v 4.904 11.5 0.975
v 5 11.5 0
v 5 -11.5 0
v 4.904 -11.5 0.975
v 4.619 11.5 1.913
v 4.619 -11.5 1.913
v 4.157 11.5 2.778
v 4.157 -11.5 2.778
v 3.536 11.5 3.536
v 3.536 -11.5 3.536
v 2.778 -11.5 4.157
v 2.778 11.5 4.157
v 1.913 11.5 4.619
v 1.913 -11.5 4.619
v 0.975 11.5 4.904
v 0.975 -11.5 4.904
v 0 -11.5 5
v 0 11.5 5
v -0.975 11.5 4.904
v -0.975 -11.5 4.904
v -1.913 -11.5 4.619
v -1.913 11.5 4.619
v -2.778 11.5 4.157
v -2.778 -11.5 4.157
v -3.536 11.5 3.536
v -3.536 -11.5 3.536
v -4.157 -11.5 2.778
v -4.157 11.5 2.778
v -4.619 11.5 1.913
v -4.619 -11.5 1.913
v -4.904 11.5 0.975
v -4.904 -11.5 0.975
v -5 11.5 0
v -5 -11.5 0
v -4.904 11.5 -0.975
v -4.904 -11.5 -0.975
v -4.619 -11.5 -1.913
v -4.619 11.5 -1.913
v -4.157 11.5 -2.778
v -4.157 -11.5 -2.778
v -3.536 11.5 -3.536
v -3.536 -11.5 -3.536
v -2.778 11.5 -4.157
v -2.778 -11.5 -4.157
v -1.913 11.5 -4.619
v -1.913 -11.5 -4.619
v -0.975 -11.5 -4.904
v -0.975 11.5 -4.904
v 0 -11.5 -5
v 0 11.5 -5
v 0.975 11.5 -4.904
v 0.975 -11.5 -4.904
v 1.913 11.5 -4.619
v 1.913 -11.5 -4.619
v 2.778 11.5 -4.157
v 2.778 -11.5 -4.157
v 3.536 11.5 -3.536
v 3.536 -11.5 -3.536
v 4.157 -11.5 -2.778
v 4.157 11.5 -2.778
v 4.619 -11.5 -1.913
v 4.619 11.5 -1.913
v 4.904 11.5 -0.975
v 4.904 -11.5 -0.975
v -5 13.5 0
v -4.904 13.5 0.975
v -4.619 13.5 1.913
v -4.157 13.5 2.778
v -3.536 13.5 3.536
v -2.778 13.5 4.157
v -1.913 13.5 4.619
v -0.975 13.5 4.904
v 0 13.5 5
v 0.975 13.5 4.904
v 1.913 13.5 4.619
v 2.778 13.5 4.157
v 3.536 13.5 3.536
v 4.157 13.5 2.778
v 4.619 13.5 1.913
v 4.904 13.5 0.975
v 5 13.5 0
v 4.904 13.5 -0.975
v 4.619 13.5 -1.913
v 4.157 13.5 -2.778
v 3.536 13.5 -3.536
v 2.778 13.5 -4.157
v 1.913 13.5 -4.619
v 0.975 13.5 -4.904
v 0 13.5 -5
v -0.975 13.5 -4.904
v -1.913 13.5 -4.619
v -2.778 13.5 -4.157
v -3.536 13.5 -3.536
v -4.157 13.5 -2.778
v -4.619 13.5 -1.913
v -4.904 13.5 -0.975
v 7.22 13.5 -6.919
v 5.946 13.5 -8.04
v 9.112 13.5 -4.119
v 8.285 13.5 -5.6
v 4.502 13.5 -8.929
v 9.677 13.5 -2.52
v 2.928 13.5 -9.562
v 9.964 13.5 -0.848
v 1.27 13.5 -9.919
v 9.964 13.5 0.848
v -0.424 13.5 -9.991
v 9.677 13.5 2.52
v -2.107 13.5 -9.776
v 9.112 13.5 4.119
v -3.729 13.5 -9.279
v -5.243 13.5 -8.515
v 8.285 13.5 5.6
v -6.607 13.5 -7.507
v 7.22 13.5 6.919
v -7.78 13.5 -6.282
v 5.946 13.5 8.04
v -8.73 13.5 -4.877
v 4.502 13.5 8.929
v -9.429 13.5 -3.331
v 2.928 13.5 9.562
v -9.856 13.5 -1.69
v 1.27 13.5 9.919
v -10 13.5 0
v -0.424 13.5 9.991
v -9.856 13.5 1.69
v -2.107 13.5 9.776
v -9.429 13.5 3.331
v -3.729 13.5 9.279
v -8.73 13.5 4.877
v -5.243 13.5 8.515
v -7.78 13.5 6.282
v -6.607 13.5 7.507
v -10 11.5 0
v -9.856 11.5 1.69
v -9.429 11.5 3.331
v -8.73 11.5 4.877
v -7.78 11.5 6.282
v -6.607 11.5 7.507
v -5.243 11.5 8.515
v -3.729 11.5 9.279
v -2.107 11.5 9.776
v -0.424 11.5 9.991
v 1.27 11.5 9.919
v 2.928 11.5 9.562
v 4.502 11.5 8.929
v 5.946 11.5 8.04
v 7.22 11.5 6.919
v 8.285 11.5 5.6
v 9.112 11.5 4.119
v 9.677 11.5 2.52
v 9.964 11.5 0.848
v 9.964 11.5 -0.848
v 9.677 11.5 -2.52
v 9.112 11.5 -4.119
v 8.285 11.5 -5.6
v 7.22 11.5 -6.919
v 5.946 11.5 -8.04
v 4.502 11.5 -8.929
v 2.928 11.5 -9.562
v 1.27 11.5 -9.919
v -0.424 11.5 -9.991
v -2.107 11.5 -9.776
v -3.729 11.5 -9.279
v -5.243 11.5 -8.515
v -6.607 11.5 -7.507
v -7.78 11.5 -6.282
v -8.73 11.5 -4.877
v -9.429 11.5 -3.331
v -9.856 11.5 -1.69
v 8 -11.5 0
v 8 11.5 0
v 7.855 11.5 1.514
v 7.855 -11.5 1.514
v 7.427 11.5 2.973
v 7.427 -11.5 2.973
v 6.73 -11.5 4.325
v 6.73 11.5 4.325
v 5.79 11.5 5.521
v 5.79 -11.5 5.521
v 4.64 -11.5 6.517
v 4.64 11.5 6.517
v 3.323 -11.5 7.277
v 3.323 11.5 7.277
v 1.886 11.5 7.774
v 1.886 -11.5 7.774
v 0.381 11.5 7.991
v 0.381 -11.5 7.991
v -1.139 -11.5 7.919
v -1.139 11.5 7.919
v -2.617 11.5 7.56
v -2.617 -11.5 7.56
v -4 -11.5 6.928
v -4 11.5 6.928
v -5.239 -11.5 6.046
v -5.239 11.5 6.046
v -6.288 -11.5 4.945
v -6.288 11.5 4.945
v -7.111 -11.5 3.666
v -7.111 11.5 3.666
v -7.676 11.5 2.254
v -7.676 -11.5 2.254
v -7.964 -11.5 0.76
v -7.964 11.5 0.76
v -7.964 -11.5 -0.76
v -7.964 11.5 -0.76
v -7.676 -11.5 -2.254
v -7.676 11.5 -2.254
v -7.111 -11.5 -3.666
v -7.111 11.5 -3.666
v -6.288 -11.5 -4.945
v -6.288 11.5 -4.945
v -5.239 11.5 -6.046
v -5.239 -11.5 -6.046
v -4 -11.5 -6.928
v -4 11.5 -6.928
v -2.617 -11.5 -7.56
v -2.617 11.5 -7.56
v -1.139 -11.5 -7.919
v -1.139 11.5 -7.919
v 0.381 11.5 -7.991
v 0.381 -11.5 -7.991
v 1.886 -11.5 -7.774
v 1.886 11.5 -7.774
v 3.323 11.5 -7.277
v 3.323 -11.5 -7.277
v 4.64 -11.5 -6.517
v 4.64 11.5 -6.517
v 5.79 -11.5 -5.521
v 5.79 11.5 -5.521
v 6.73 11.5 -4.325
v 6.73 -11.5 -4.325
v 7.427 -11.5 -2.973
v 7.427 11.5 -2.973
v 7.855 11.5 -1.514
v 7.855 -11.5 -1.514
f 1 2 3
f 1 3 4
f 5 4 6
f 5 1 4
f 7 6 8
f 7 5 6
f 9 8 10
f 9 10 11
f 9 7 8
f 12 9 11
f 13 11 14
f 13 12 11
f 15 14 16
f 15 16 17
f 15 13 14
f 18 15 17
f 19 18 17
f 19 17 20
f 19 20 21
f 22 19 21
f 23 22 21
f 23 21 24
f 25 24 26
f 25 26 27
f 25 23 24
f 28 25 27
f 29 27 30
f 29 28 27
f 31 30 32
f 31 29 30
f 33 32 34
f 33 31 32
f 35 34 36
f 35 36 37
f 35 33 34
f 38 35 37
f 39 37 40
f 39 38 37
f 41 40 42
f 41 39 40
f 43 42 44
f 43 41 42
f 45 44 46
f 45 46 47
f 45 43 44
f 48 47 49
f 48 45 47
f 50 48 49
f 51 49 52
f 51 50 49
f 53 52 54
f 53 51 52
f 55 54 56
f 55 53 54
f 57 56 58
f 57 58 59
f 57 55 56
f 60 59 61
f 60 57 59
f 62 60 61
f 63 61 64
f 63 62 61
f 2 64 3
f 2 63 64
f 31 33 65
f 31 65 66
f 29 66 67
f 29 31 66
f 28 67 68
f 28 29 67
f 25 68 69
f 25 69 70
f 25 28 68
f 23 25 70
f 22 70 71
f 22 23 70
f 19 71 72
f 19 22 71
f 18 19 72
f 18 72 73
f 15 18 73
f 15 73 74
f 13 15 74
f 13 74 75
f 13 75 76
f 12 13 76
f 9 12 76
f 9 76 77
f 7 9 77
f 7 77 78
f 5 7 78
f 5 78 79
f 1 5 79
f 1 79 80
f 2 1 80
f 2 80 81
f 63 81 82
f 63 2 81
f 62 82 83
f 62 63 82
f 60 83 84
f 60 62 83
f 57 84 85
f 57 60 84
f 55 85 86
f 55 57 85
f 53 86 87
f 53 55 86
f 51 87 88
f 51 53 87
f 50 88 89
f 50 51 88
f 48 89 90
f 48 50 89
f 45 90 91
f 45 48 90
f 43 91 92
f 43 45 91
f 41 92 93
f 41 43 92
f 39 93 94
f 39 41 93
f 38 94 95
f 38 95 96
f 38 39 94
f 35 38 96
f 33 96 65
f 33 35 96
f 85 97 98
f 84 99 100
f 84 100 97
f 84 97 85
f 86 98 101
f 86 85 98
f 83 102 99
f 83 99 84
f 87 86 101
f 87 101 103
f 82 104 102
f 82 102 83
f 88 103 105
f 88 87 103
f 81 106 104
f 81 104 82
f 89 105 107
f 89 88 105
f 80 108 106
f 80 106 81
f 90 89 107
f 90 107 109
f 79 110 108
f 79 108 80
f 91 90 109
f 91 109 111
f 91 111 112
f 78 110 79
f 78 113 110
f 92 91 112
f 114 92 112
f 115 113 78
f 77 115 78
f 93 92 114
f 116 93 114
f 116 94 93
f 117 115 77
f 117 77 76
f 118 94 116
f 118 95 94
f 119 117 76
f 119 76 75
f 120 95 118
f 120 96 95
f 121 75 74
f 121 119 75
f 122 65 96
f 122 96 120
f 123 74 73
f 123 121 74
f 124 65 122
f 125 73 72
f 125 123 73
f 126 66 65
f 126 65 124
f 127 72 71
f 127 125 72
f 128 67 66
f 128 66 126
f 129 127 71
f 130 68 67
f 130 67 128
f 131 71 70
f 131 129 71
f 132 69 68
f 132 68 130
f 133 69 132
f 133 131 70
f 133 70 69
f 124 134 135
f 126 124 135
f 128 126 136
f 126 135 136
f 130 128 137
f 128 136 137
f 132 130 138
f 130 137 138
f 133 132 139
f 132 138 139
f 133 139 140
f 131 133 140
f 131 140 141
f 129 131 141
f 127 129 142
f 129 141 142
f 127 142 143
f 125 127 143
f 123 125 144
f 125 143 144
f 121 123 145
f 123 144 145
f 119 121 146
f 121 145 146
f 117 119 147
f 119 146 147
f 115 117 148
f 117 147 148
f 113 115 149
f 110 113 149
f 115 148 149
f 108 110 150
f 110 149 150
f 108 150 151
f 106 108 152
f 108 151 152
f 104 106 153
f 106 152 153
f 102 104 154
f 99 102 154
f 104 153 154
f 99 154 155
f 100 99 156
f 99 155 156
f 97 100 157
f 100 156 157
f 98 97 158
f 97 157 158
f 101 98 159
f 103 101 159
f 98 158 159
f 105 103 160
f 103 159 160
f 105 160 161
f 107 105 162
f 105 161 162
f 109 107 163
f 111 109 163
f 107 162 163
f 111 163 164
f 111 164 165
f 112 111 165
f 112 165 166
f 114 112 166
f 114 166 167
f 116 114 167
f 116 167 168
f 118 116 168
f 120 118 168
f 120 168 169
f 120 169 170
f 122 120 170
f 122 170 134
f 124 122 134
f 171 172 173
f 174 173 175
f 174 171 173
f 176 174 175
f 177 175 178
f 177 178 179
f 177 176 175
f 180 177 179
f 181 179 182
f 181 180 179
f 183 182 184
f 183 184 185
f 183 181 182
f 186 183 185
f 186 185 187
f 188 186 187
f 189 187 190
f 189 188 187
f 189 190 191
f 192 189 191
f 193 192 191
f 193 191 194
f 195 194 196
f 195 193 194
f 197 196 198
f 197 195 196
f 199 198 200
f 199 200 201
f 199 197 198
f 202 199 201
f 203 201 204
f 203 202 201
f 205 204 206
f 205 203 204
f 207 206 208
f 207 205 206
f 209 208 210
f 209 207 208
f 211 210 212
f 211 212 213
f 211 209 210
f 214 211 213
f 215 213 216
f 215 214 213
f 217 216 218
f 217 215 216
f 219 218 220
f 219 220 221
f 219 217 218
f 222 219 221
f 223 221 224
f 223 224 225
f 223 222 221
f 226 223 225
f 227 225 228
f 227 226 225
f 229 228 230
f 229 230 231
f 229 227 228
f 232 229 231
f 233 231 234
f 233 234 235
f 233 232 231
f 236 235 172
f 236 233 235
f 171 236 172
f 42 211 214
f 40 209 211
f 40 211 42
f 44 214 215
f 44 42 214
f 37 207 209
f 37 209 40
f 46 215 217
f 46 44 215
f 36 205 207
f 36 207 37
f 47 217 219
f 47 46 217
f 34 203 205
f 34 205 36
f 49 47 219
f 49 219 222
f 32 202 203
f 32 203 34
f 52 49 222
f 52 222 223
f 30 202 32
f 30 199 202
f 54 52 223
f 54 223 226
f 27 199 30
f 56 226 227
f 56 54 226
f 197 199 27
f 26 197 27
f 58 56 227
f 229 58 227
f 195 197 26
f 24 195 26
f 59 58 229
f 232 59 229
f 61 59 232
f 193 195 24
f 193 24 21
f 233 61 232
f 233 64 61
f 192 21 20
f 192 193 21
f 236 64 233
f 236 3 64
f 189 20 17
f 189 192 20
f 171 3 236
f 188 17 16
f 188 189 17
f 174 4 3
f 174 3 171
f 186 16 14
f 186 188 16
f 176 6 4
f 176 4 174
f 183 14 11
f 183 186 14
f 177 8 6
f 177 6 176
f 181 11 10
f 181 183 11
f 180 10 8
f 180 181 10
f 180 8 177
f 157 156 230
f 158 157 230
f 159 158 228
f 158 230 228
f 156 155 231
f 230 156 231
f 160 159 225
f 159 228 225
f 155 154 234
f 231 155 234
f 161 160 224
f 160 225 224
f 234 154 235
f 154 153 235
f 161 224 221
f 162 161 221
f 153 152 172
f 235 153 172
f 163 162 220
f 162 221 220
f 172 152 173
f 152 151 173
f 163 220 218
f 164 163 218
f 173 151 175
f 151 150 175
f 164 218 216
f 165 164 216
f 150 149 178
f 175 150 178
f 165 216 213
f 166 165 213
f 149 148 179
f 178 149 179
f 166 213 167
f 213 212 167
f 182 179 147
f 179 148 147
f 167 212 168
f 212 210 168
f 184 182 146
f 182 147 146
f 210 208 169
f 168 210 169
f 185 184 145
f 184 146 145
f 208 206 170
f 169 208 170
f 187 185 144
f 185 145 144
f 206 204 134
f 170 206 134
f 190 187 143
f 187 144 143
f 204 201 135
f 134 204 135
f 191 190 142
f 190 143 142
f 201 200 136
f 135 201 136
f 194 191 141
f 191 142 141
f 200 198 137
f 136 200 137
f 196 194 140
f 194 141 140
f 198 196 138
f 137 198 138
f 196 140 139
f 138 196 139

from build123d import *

# Parameters (mm, degrees)
F0_R     = 8
F0_R_2   = 5
F1_DEPTH = 11.5
F2_R     = 10
F2_R_2   = 8
F2_R_3   = 5
F3_DEPTH = 2


with BuildPart() as f1:
    # F0 (on Front) → F1 (new body, symmetric)
    with BuildSketch(Plane.XZ):
        Circle(F0_R)
        Circle(F0_R_2, mode=Mode.SUBTRACT)
    extrude(amount=F1_DEPTH, both=True)

    # F2 (on face) → F3 (join)
    with BuildSketch(Plane(origin=(0, 11.5, 0), x_dir=(-1, 0, 0), z_dir=(0, 1, 0))):
        Circle(F2_R)
        Circle(F2_R_2, mode=Mode.SUBTRACT)
        Circle(F2_R_2)
        Circle(F2_R_3, mode=Mode.SUBTRACT)
    extrude(amount=F3_DEPTH)


solid = f1.part
